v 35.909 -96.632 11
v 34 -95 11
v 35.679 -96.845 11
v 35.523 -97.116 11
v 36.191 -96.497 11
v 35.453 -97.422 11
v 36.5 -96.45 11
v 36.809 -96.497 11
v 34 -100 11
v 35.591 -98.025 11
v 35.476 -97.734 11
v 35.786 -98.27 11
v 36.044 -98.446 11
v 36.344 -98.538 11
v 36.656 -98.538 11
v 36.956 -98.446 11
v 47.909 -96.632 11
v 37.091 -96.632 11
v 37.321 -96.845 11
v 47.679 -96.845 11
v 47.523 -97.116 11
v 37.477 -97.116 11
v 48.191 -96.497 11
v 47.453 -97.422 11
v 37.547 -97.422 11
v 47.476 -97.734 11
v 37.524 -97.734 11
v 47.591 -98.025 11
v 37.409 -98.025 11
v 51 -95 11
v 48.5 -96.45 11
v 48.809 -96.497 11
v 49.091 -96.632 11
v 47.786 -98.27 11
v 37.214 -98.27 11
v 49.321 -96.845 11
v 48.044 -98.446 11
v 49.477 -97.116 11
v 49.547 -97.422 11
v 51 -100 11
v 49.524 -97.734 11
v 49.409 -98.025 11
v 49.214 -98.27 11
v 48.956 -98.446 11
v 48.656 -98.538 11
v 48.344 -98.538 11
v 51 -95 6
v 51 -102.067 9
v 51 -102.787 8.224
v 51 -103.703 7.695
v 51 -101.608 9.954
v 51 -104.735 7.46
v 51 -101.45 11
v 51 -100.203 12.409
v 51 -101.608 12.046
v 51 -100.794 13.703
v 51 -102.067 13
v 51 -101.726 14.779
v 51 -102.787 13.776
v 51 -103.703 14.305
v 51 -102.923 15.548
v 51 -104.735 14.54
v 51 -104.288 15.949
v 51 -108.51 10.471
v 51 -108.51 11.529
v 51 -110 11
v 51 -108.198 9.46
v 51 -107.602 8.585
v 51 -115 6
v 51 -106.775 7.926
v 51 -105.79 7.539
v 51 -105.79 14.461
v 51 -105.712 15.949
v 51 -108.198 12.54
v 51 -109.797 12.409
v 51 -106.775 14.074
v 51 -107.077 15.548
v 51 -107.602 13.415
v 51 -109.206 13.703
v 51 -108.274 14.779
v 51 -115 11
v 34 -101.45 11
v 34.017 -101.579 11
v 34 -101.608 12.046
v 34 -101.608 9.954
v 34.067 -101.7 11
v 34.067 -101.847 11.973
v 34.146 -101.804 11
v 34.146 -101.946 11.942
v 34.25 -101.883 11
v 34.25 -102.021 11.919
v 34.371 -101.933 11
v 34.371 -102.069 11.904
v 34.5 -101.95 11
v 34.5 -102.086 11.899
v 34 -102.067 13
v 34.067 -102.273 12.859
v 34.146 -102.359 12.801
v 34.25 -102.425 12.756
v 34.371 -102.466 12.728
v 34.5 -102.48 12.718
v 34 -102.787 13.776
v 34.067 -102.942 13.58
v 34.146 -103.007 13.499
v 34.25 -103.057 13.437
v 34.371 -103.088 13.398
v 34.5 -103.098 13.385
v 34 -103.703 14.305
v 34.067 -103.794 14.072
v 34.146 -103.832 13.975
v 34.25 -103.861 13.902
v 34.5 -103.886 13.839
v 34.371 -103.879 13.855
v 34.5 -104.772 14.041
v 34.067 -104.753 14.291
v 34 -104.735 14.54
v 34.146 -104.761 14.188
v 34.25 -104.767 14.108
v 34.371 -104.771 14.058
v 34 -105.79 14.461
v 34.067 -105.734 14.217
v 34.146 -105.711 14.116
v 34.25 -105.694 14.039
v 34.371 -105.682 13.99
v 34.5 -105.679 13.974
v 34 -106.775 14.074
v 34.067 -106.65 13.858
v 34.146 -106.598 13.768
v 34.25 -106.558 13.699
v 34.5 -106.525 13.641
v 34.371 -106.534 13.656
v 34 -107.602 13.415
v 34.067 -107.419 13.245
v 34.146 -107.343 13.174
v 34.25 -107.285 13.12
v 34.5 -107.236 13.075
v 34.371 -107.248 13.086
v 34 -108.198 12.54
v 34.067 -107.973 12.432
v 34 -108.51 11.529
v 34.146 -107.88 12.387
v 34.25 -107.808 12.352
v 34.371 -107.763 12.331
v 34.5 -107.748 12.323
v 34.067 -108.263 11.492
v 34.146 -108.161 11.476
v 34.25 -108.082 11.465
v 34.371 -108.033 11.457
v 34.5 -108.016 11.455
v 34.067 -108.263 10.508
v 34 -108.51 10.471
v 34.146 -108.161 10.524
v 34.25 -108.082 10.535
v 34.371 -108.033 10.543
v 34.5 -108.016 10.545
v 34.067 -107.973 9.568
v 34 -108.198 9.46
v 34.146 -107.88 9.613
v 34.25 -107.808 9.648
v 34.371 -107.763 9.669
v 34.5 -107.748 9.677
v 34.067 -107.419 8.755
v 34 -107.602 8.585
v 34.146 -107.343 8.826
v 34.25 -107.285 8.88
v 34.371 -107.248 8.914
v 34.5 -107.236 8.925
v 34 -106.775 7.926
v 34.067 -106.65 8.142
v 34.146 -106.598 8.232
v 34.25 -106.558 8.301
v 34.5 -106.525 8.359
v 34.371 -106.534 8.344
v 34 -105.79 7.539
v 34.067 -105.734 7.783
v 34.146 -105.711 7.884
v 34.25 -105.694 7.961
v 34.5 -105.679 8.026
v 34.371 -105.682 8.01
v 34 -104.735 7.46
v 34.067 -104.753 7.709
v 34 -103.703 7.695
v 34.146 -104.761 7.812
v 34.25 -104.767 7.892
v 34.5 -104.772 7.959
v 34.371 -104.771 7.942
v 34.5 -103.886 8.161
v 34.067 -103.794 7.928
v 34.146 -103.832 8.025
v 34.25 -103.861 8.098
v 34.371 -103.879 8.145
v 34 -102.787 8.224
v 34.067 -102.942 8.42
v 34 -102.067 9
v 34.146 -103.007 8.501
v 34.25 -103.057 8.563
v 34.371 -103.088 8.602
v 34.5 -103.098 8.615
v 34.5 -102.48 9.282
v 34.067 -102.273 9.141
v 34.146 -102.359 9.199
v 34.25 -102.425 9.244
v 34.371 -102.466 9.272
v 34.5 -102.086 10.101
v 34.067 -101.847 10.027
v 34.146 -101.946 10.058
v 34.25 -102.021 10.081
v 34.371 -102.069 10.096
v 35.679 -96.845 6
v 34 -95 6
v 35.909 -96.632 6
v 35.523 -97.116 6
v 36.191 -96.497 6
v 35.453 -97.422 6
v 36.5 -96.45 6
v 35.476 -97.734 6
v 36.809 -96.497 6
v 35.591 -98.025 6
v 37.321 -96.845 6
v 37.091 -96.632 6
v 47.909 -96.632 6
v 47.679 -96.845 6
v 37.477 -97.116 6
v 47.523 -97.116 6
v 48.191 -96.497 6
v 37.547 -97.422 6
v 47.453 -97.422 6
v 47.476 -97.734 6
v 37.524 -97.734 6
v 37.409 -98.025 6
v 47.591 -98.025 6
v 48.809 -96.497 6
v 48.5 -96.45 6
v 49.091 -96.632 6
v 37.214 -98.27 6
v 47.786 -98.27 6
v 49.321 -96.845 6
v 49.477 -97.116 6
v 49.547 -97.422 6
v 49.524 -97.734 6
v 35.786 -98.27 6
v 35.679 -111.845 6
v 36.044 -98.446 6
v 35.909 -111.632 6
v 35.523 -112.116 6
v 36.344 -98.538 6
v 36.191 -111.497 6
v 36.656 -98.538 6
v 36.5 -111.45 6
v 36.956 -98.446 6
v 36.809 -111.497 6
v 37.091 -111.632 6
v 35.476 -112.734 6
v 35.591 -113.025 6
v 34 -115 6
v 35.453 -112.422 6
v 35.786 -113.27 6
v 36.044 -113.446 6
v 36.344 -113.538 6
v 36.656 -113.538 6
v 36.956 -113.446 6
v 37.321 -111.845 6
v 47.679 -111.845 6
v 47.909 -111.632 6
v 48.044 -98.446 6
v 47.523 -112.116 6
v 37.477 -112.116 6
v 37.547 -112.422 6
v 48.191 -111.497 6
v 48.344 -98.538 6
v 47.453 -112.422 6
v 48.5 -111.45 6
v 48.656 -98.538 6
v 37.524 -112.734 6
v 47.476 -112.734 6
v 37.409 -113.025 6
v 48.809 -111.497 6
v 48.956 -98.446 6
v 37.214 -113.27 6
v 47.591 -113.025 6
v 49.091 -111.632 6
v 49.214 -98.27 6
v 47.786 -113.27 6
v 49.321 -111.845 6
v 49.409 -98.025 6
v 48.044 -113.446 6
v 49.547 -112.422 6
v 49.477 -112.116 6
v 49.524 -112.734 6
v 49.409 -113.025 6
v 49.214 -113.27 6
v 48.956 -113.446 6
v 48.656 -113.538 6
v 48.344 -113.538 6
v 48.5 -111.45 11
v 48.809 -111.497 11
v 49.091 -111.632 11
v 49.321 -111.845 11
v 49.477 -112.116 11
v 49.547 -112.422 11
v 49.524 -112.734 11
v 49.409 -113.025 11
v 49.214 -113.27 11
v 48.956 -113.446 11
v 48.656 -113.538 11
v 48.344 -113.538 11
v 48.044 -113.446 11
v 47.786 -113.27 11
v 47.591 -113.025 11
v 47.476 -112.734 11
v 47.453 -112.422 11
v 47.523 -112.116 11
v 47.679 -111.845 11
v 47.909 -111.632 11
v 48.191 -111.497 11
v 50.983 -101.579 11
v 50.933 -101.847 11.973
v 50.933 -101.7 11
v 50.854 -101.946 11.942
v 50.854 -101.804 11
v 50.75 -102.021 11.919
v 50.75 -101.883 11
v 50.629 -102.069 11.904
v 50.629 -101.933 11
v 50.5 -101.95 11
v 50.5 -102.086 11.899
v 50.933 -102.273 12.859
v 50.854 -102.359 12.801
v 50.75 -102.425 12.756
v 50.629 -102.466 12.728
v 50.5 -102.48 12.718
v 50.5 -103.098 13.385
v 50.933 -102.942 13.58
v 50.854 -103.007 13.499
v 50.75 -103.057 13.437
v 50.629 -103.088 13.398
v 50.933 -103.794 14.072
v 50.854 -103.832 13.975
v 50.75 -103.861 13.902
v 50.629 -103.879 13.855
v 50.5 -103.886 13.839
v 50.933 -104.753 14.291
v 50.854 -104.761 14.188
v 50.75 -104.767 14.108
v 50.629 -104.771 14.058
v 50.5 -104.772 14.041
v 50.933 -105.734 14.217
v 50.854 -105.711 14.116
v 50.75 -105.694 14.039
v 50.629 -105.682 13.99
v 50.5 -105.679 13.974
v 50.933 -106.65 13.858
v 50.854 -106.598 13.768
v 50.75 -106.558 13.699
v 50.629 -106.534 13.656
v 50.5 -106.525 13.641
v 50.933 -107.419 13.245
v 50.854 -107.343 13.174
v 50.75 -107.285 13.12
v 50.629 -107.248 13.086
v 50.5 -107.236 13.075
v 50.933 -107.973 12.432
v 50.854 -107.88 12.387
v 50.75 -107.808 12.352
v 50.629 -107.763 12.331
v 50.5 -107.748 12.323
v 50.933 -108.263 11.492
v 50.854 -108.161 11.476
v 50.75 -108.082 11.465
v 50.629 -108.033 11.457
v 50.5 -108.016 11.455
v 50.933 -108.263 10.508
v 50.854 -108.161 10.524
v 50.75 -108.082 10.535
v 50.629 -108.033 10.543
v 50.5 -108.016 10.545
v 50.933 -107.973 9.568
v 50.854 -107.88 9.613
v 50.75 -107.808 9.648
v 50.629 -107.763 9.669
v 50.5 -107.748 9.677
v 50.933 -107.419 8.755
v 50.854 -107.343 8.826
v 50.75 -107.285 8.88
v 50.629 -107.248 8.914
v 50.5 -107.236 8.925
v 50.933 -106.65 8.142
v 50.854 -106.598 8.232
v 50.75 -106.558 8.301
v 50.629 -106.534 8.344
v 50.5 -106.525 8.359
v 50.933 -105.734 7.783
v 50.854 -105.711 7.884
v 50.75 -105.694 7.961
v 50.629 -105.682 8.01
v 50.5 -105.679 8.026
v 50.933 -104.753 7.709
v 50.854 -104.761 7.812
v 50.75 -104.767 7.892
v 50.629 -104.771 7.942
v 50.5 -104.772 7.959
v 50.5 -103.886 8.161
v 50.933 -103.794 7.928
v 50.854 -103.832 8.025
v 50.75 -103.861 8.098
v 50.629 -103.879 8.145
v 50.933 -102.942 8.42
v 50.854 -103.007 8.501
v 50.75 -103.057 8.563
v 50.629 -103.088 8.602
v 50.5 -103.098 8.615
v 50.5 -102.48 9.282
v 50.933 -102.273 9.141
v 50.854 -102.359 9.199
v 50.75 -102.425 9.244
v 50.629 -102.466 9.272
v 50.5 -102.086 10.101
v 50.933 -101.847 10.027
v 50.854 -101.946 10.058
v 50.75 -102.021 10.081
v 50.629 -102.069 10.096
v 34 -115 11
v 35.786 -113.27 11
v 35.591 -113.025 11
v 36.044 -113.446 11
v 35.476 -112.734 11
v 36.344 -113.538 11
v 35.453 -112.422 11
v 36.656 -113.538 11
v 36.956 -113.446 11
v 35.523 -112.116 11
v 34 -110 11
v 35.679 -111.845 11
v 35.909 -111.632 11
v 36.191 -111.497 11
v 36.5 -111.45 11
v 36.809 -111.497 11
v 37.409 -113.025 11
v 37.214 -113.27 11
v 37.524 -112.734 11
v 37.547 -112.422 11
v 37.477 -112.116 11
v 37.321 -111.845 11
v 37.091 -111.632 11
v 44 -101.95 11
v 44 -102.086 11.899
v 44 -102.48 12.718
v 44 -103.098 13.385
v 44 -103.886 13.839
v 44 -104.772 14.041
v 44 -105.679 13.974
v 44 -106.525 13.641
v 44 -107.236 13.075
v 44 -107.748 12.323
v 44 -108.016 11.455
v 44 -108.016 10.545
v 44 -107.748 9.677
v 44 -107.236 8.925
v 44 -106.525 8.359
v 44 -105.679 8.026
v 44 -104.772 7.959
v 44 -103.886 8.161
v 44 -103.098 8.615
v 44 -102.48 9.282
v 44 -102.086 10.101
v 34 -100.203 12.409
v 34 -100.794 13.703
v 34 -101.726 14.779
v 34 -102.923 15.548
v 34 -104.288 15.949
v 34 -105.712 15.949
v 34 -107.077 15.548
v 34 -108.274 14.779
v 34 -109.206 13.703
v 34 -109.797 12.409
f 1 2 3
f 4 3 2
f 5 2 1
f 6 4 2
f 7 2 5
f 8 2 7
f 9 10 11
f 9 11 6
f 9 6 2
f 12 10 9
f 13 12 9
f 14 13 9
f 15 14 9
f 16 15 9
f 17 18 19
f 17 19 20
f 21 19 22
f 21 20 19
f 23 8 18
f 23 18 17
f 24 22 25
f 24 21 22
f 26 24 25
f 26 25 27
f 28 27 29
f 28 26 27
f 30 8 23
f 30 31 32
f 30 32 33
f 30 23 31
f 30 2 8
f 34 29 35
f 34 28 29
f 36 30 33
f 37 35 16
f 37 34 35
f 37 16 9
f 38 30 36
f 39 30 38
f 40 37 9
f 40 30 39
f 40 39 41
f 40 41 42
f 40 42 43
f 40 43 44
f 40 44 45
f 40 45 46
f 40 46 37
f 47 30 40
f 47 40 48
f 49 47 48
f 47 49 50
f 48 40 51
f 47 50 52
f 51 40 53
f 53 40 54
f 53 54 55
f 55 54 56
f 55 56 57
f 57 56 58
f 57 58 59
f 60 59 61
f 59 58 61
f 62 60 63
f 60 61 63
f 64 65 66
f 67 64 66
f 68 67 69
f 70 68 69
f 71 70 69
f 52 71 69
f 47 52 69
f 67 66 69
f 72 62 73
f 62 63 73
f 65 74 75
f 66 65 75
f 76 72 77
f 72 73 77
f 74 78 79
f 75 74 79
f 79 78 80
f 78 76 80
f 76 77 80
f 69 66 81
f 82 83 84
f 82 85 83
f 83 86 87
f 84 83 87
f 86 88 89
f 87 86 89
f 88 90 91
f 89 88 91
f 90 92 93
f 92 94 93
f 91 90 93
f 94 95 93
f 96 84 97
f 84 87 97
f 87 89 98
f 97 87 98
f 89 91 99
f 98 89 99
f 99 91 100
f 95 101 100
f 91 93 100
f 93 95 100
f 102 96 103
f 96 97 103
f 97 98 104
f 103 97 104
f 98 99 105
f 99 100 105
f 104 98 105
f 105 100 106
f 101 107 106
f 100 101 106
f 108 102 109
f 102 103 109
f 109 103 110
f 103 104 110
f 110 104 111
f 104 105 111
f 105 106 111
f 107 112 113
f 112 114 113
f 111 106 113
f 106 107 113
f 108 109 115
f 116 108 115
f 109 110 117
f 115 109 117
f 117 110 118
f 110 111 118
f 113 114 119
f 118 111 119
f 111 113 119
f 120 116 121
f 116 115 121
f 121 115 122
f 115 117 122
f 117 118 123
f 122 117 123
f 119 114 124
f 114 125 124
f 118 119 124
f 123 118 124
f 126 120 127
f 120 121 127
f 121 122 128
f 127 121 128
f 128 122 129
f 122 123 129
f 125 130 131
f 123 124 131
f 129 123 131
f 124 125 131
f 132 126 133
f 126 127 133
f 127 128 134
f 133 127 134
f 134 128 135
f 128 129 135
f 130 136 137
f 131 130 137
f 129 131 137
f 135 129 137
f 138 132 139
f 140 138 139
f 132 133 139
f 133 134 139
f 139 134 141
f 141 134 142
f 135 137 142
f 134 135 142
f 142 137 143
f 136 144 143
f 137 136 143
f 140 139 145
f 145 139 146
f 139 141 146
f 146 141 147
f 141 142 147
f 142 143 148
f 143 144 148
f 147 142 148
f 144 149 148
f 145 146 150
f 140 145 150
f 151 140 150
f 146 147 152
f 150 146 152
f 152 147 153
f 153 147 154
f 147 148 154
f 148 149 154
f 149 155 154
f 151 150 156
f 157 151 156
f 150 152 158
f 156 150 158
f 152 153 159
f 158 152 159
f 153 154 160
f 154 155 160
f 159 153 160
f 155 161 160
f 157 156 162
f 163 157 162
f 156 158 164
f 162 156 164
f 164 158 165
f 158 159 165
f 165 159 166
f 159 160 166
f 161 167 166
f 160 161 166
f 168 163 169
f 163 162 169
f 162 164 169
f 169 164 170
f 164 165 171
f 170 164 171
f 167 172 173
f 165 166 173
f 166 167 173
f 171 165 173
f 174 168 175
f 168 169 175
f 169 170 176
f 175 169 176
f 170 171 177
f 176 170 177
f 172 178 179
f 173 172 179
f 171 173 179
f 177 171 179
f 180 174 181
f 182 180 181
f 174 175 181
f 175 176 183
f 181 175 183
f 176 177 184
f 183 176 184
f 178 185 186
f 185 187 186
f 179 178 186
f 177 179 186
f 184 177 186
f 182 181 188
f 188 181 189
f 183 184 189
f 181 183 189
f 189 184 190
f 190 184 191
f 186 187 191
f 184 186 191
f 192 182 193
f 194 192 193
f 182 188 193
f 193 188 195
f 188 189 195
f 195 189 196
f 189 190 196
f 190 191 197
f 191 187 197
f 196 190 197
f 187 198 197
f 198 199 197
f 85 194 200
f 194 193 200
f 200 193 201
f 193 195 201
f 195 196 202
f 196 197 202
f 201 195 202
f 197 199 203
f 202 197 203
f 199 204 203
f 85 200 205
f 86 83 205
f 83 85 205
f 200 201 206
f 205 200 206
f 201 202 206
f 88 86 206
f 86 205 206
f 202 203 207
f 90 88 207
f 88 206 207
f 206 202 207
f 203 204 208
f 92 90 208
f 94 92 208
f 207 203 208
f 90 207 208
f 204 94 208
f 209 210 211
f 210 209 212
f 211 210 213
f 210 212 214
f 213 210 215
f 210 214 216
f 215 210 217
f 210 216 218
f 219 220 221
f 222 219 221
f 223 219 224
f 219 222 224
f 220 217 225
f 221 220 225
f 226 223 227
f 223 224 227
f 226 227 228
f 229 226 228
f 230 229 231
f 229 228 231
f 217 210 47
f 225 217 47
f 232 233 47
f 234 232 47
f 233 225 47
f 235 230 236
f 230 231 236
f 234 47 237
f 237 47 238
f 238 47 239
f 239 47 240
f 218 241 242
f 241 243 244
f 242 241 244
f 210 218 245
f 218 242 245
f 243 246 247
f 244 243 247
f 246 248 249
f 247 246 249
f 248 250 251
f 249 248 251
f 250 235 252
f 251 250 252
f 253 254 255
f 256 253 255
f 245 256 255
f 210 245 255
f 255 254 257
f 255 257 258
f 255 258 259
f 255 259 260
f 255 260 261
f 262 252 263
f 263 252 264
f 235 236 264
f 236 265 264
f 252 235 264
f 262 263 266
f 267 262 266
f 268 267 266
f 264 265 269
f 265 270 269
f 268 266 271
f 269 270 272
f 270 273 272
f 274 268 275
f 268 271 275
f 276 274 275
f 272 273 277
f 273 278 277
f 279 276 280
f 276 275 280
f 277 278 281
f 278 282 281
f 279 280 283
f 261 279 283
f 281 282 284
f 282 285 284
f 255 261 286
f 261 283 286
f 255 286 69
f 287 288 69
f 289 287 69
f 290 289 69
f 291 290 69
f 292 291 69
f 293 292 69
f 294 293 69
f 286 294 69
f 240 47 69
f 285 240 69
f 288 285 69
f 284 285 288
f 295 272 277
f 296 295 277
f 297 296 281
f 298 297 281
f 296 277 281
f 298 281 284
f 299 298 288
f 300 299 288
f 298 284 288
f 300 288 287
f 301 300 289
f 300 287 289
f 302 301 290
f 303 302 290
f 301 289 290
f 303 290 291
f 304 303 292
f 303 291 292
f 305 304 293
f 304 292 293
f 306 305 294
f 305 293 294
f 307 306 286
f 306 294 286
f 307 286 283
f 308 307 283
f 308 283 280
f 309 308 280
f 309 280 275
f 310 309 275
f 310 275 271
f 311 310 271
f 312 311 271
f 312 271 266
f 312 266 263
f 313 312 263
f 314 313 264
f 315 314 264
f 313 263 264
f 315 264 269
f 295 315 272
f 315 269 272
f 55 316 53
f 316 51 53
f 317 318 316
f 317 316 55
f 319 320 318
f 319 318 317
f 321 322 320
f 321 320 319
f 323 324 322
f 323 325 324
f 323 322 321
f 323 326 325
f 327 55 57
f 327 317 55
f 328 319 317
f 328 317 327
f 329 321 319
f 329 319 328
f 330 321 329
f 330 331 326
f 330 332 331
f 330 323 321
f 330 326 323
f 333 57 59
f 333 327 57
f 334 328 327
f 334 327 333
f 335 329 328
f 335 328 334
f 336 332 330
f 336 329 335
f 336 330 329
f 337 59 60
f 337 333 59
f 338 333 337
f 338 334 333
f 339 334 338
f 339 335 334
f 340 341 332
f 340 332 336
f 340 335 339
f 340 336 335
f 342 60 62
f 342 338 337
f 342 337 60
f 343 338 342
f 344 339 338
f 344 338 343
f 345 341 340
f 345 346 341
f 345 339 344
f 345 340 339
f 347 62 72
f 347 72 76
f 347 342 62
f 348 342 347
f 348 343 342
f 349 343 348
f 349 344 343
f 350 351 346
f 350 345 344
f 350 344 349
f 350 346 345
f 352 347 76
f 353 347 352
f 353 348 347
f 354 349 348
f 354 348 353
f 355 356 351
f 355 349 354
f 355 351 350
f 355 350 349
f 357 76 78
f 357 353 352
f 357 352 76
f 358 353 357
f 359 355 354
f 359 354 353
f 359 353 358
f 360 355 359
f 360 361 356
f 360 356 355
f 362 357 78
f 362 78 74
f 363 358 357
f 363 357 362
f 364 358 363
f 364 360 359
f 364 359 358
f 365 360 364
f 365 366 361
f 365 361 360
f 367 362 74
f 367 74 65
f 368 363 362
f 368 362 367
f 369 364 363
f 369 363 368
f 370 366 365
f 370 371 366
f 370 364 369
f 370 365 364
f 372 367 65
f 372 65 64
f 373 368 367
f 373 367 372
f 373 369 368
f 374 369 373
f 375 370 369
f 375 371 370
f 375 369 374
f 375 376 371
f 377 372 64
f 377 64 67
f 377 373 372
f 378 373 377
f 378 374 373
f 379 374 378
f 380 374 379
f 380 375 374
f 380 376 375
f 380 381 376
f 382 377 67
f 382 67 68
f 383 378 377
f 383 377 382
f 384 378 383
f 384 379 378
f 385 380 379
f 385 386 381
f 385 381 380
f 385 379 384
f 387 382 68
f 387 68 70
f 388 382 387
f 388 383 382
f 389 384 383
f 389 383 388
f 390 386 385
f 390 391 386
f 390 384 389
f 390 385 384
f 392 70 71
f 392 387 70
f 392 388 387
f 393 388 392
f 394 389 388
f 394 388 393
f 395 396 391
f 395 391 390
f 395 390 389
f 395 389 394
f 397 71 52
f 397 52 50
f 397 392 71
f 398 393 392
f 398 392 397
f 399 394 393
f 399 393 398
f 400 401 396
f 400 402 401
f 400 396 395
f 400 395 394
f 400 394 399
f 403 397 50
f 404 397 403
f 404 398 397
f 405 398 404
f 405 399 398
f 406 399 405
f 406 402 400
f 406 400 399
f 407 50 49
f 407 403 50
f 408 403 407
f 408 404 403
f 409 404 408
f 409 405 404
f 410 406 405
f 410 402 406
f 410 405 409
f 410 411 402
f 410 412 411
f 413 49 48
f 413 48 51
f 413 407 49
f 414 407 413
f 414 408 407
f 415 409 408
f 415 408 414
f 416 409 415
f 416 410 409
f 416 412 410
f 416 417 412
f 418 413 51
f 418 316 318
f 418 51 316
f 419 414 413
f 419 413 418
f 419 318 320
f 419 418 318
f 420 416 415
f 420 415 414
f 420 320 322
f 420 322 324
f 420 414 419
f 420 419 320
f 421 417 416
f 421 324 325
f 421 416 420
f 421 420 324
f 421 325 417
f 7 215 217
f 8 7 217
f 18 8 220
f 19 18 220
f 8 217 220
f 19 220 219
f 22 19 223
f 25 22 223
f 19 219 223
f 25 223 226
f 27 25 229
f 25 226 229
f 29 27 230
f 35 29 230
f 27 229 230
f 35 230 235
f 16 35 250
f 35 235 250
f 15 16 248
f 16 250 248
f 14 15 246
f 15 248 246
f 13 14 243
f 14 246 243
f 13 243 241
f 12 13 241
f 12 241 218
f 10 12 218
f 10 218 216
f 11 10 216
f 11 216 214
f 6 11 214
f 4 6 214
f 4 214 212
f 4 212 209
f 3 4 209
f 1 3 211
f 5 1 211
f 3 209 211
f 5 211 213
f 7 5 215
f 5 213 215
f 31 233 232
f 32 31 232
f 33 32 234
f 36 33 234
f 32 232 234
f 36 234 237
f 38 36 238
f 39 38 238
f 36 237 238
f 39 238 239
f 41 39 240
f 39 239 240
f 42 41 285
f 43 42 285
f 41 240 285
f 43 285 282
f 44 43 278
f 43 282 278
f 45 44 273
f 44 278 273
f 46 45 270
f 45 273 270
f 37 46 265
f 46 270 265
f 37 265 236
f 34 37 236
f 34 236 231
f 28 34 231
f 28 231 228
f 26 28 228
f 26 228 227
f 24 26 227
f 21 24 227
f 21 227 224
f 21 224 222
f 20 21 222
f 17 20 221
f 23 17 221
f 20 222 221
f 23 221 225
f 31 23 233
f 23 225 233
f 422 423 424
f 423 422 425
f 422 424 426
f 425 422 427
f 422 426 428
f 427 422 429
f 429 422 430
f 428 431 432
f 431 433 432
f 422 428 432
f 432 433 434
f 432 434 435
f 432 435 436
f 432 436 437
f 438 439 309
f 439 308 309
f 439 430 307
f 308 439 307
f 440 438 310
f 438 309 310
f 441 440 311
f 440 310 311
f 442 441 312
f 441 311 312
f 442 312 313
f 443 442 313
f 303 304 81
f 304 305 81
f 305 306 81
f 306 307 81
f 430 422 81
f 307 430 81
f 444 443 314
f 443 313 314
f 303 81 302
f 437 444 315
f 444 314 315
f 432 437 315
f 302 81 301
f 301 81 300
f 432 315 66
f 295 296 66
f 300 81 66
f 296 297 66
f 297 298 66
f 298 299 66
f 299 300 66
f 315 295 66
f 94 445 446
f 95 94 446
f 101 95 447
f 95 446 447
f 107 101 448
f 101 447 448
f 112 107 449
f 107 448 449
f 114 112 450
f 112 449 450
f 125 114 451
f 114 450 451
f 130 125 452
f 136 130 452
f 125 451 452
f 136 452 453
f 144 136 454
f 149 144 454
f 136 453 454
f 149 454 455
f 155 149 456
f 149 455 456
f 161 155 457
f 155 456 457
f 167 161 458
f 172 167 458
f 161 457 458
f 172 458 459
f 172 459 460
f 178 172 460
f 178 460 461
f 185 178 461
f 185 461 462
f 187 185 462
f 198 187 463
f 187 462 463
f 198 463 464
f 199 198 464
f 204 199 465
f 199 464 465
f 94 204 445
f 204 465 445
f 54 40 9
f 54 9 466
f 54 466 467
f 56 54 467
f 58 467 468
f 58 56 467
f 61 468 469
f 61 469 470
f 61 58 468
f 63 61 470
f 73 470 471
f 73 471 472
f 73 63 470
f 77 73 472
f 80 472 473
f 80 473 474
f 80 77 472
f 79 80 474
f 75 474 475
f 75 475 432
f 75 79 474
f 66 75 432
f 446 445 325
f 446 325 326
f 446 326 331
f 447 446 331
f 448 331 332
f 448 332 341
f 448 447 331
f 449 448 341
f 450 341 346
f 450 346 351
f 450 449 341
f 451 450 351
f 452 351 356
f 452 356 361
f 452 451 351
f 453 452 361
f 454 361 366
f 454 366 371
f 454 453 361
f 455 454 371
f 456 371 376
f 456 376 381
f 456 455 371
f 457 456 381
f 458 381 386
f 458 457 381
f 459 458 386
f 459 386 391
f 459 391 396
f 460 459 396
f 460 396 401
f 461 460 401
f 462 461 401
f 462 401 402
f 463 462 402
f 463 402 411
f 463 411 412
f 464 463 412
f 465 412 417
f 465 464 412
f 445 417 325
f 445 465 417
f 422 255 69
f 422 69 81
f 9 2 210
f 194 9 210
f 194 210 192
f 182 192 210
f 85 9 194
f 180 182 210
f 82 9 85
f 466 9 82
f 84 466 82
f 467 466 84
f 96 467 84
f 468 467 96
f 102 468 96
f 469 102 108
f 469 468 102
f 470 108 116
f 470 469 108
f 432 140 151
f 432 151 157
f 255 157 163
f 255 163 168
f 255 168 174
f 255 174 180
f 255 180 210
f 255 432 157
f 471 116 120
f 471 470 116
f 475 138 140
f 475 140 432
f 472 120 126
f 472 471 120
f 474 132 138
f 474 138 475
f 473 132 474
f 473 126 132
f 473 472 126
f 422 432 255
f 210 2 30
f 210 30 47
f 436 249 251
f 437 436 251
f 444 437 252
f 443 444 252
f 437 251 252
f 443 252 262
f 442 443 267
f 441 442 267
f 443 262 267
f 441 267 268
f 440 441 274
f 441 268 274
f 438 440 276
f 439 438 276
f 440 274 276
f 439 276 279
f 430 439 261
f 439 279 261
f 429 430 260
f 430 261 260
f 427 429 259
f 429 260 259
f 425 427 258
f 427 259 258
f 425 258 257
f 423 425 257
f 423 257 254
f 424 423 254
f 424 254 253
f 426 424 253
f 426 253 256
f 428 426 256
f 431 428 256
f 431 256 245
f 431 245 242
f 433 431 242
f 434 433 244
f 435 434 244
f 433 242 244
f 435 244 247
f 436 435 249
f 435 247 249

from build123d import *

# Parameters (mm, degrees)
SKETCH_R                 = 3.05
PAD_DEPTH                = 7
PAD_DEPTH_BACK           = 10
SKETCH001_R              = 1.05
POCKET_DEPTH             = 5
FILLET_R                 = 0.5
CLONE001_PLACEMENT_ANGLE = 90


with BuildPart() as part:
    # Sketch → Pad (new body, two sides)
    with BuildSketch(Plane.XZ) as pad_sk:
        with BuildLine():
            Line((10, 0), (10, -5))
            Line((10, -5), (-10, -5))
            Line((-10, -5), (-10, 0))
            Line((-10, 0), (-5, 0))
            ThreePointArc((5, 0), (0, 5), (-5, 0))
            Line((10, 0), (5, 0))
        make_face()
        Circle(SKETCH_R, mode=Mode.SUBTRACT)
    extrude(amount=PAD_DEPTH)
    extrude(pad_sk.sketch, amount=-PAD_DEPTH_BACK)

    # Sketch001 → Pocket (cut)
    with BuildSketch(Plane(origin=(0, 0, -5), x_dir=(1, 0, 0), z_dir=(0, 0, -1))):
        with Locations((-7.5, 4.5)):
            Circle(SKETCH001_R)
        with Locations((-7.5, -7.5)):
            Circle(SKETCH001_R)
        with Locations((7.5, -7.5)):
            Circle(SKETCH001_R)
        with Locations((7.5, 4.5)):
            Circle(SKETCH001_R)
    extrude(amount=-POCKET_DEPTH, mode=Mode.SUBTRACT)

    # Fillet
    fillet_edges = [part.edges().sort_by_distance(p)[0] for p in [
        (-3.05, 10, 0),
        (-3.05, -7, 0),
    ]]
    fillet(fillet_edges, radius=FILLET_R)


with BuildPart() as part_1:
    # Clone001 placement: moved
    add(part.part.moved(Location((44, -105, 11))).rotate(Axis((44, -105, 11), (0, 0, 1)), CLONE001_PLACEMENT_ANGLE))


solid = part_1.part
